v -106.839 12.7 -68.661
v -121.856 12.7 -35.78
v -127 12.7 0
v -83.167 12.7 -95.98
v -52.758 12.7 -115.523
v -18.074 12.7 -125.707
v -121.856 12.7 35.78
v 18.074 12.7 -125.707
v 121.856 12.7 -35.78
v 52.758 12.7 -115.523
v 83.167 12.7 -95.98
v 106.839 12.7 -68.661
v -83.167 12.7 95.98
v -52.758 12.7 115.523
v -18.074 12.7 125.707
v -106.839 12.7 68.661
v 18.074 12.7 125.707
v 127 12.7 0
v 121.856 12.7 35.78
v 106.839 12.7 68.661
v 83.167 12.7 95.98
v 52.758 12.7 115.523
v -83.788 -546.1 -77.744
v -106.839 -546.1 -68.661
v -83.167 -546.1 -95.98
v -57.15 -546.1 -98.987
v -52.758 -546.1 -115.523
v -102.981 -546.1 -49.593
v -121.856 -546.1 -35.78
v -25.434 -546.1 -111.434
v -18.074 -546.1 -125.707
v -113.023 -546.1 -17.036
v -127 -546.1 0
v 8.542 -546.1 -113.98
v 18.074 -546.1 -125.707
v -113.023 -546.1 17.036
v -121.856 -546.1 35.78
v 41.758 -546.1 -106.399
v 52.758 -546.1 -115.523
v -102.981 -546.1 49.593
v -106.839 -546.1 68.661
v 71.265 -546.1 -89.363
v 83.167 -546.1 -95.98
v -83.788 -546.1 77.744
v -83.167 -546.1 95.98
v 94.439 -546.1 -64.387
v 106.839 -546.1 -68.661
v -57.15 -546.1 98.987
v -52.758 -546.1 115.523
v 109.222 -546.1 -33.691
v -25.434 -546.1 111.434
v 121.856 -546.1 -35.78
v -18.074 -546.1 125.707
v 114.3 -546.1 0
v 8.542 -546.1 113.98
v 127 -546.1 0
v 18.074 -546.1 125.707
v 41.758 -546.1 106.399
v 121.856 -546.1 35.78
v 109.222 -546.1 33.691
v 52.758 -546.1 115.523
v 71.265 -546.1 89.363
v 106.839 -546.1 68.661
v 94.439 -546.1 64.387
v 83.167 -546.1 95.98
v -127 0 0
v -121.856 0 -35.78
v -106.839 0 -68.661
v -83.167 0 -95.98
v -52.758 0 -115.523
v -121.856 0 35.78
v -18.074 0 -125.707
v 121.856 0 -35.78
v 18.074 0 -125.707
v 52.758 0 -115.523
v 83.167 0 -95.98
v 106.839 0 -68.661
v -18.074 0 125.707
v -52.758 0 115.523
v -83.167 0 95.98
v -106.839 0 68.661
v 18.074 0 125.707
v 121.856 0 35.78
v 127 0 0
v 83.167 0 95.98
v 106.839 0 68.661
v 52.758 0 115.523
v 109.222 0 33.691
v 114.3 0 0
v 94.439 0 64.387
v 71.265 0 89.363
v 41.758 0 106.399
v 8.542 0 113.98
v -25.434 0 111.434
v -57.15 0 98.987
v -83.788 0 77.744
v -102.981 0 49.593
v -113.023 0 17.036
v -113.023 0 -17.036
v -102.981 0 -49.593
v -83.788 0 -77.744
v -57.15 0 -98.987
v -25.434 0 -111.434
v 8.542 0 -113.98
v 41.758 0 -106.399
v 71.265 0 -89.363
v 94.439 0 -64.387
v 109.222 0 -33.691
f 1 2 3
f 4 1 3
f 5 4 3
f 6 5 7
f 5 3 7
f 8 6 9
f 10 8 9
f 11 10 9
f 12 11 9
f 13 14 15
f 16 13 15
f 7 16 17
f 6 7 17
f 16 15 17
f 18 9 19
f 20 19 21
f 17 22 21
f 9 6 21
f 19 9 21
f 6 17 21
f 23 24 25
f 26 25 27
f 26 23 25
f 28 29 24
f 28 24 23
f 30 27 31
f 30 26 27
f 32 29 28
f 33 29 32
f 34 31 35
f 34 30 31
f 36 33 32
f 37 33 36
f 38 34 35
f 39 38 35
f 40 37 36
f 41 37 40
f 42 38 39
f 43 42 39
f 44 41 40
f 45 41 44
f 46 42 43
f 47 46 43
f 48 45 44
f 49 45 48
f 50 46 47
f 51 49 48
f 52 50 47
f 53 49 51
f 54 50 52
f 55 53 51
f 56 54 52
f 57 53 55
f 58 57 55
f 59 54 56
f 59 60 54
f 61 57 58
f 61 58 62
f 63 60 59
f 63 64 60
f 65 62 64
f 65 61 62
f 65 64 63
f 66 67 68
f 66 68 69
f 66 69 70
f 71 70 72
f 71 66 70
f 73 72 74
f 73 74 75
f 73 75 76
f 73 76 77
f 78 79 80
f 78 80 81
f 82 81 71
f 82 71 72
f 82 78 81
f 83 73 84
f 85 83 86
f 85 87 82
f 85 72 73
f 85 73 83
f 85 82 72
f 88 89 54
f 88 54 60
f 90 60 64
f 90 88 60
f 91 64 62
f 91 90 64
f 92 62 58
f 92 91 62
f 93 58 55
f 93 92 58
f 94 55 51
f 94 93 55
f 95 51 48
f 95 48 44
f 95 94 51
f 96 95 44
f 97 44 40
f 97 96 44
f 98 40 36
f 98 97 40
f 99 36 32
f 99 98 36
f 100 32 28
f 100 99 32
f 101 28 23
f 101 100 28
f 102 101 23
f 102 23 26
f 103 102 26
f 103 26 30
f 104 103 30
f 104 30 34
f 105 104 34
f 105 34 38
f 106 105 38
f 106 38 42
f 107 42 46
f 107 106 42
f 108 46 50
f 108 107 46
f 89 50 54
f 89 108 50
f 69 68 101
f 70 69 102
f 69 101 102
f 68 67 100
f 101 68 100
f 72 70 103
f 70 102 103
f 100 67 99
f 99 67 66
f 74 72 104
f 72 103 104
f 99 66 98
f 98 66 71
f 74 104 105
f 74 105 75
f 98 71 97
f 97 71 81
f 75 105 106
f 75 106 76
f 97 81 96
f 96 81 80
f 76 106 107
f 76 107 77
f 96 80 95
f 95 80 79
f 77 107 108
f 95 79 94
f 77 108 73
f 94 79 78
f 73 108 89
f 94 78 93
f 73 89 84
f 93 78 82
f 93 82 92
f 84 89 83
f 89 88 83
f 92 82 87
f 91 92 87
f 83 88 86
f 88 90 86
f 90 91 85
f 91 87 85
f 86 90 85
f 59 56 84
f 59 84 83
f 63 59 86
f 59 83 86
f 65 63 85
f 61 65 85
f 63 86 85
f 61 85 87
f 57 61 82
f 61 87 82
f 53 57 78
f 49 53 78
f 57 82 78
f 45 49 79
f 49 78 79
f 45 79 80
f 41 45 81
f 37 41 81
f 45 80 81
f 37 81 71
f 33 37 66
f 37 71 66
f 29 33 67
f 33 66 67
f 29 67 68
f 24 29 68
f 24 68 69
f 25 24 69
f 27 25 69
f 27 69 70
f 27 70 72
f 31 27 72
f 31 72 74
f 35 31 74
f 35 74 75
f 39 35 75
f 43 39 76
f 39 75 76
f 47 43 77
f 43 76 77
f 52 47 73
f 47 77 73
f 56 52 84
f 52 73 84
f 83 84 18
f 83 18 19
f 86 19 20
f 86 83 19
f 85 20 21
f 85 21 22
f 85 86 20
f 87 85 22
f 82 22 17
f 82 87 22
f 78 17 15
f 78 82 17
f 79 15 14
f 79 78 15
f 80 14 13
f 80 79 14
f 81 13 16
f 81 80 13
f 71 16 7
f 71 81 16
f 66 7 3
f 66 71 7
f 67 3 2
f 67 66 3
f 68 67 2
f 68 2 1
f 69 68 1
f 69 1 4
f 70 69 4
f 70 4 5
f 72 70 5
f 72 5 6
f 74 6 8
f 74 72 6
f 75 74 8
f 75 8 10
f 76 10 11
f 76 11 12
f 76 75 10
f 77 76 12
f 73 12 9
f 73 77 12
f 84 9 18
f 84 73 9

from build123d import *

# Parameters (mm, degrees)
F0_R     = 127
F0_R_2   = 114.3
F1_DEPTH = 546.1
F2_DEPTH = 12.7


with BuildPart() as f1:
    # F0 (on Front) → F1 (new body)
    with BuildSketch(Plane.XZ):
        Circle(F0_R)
        Circle(F0_R_2, mode=Mode.SUBTRACT)
    extrude(amount=F1_DEPTH)


with BuildPart() as f2:
    # F0 (on Front) → F2 (new body)
    with BuildSketch(Plane.XZ):
        Circle(F0_R)
        Circle(F0_R_2, mode=Mode.SUBTRACT)
        Circle(F0_R_2)
    extrude(amount=-F2_DEPTH)


solid = Compound([f1.part, f2.part])
